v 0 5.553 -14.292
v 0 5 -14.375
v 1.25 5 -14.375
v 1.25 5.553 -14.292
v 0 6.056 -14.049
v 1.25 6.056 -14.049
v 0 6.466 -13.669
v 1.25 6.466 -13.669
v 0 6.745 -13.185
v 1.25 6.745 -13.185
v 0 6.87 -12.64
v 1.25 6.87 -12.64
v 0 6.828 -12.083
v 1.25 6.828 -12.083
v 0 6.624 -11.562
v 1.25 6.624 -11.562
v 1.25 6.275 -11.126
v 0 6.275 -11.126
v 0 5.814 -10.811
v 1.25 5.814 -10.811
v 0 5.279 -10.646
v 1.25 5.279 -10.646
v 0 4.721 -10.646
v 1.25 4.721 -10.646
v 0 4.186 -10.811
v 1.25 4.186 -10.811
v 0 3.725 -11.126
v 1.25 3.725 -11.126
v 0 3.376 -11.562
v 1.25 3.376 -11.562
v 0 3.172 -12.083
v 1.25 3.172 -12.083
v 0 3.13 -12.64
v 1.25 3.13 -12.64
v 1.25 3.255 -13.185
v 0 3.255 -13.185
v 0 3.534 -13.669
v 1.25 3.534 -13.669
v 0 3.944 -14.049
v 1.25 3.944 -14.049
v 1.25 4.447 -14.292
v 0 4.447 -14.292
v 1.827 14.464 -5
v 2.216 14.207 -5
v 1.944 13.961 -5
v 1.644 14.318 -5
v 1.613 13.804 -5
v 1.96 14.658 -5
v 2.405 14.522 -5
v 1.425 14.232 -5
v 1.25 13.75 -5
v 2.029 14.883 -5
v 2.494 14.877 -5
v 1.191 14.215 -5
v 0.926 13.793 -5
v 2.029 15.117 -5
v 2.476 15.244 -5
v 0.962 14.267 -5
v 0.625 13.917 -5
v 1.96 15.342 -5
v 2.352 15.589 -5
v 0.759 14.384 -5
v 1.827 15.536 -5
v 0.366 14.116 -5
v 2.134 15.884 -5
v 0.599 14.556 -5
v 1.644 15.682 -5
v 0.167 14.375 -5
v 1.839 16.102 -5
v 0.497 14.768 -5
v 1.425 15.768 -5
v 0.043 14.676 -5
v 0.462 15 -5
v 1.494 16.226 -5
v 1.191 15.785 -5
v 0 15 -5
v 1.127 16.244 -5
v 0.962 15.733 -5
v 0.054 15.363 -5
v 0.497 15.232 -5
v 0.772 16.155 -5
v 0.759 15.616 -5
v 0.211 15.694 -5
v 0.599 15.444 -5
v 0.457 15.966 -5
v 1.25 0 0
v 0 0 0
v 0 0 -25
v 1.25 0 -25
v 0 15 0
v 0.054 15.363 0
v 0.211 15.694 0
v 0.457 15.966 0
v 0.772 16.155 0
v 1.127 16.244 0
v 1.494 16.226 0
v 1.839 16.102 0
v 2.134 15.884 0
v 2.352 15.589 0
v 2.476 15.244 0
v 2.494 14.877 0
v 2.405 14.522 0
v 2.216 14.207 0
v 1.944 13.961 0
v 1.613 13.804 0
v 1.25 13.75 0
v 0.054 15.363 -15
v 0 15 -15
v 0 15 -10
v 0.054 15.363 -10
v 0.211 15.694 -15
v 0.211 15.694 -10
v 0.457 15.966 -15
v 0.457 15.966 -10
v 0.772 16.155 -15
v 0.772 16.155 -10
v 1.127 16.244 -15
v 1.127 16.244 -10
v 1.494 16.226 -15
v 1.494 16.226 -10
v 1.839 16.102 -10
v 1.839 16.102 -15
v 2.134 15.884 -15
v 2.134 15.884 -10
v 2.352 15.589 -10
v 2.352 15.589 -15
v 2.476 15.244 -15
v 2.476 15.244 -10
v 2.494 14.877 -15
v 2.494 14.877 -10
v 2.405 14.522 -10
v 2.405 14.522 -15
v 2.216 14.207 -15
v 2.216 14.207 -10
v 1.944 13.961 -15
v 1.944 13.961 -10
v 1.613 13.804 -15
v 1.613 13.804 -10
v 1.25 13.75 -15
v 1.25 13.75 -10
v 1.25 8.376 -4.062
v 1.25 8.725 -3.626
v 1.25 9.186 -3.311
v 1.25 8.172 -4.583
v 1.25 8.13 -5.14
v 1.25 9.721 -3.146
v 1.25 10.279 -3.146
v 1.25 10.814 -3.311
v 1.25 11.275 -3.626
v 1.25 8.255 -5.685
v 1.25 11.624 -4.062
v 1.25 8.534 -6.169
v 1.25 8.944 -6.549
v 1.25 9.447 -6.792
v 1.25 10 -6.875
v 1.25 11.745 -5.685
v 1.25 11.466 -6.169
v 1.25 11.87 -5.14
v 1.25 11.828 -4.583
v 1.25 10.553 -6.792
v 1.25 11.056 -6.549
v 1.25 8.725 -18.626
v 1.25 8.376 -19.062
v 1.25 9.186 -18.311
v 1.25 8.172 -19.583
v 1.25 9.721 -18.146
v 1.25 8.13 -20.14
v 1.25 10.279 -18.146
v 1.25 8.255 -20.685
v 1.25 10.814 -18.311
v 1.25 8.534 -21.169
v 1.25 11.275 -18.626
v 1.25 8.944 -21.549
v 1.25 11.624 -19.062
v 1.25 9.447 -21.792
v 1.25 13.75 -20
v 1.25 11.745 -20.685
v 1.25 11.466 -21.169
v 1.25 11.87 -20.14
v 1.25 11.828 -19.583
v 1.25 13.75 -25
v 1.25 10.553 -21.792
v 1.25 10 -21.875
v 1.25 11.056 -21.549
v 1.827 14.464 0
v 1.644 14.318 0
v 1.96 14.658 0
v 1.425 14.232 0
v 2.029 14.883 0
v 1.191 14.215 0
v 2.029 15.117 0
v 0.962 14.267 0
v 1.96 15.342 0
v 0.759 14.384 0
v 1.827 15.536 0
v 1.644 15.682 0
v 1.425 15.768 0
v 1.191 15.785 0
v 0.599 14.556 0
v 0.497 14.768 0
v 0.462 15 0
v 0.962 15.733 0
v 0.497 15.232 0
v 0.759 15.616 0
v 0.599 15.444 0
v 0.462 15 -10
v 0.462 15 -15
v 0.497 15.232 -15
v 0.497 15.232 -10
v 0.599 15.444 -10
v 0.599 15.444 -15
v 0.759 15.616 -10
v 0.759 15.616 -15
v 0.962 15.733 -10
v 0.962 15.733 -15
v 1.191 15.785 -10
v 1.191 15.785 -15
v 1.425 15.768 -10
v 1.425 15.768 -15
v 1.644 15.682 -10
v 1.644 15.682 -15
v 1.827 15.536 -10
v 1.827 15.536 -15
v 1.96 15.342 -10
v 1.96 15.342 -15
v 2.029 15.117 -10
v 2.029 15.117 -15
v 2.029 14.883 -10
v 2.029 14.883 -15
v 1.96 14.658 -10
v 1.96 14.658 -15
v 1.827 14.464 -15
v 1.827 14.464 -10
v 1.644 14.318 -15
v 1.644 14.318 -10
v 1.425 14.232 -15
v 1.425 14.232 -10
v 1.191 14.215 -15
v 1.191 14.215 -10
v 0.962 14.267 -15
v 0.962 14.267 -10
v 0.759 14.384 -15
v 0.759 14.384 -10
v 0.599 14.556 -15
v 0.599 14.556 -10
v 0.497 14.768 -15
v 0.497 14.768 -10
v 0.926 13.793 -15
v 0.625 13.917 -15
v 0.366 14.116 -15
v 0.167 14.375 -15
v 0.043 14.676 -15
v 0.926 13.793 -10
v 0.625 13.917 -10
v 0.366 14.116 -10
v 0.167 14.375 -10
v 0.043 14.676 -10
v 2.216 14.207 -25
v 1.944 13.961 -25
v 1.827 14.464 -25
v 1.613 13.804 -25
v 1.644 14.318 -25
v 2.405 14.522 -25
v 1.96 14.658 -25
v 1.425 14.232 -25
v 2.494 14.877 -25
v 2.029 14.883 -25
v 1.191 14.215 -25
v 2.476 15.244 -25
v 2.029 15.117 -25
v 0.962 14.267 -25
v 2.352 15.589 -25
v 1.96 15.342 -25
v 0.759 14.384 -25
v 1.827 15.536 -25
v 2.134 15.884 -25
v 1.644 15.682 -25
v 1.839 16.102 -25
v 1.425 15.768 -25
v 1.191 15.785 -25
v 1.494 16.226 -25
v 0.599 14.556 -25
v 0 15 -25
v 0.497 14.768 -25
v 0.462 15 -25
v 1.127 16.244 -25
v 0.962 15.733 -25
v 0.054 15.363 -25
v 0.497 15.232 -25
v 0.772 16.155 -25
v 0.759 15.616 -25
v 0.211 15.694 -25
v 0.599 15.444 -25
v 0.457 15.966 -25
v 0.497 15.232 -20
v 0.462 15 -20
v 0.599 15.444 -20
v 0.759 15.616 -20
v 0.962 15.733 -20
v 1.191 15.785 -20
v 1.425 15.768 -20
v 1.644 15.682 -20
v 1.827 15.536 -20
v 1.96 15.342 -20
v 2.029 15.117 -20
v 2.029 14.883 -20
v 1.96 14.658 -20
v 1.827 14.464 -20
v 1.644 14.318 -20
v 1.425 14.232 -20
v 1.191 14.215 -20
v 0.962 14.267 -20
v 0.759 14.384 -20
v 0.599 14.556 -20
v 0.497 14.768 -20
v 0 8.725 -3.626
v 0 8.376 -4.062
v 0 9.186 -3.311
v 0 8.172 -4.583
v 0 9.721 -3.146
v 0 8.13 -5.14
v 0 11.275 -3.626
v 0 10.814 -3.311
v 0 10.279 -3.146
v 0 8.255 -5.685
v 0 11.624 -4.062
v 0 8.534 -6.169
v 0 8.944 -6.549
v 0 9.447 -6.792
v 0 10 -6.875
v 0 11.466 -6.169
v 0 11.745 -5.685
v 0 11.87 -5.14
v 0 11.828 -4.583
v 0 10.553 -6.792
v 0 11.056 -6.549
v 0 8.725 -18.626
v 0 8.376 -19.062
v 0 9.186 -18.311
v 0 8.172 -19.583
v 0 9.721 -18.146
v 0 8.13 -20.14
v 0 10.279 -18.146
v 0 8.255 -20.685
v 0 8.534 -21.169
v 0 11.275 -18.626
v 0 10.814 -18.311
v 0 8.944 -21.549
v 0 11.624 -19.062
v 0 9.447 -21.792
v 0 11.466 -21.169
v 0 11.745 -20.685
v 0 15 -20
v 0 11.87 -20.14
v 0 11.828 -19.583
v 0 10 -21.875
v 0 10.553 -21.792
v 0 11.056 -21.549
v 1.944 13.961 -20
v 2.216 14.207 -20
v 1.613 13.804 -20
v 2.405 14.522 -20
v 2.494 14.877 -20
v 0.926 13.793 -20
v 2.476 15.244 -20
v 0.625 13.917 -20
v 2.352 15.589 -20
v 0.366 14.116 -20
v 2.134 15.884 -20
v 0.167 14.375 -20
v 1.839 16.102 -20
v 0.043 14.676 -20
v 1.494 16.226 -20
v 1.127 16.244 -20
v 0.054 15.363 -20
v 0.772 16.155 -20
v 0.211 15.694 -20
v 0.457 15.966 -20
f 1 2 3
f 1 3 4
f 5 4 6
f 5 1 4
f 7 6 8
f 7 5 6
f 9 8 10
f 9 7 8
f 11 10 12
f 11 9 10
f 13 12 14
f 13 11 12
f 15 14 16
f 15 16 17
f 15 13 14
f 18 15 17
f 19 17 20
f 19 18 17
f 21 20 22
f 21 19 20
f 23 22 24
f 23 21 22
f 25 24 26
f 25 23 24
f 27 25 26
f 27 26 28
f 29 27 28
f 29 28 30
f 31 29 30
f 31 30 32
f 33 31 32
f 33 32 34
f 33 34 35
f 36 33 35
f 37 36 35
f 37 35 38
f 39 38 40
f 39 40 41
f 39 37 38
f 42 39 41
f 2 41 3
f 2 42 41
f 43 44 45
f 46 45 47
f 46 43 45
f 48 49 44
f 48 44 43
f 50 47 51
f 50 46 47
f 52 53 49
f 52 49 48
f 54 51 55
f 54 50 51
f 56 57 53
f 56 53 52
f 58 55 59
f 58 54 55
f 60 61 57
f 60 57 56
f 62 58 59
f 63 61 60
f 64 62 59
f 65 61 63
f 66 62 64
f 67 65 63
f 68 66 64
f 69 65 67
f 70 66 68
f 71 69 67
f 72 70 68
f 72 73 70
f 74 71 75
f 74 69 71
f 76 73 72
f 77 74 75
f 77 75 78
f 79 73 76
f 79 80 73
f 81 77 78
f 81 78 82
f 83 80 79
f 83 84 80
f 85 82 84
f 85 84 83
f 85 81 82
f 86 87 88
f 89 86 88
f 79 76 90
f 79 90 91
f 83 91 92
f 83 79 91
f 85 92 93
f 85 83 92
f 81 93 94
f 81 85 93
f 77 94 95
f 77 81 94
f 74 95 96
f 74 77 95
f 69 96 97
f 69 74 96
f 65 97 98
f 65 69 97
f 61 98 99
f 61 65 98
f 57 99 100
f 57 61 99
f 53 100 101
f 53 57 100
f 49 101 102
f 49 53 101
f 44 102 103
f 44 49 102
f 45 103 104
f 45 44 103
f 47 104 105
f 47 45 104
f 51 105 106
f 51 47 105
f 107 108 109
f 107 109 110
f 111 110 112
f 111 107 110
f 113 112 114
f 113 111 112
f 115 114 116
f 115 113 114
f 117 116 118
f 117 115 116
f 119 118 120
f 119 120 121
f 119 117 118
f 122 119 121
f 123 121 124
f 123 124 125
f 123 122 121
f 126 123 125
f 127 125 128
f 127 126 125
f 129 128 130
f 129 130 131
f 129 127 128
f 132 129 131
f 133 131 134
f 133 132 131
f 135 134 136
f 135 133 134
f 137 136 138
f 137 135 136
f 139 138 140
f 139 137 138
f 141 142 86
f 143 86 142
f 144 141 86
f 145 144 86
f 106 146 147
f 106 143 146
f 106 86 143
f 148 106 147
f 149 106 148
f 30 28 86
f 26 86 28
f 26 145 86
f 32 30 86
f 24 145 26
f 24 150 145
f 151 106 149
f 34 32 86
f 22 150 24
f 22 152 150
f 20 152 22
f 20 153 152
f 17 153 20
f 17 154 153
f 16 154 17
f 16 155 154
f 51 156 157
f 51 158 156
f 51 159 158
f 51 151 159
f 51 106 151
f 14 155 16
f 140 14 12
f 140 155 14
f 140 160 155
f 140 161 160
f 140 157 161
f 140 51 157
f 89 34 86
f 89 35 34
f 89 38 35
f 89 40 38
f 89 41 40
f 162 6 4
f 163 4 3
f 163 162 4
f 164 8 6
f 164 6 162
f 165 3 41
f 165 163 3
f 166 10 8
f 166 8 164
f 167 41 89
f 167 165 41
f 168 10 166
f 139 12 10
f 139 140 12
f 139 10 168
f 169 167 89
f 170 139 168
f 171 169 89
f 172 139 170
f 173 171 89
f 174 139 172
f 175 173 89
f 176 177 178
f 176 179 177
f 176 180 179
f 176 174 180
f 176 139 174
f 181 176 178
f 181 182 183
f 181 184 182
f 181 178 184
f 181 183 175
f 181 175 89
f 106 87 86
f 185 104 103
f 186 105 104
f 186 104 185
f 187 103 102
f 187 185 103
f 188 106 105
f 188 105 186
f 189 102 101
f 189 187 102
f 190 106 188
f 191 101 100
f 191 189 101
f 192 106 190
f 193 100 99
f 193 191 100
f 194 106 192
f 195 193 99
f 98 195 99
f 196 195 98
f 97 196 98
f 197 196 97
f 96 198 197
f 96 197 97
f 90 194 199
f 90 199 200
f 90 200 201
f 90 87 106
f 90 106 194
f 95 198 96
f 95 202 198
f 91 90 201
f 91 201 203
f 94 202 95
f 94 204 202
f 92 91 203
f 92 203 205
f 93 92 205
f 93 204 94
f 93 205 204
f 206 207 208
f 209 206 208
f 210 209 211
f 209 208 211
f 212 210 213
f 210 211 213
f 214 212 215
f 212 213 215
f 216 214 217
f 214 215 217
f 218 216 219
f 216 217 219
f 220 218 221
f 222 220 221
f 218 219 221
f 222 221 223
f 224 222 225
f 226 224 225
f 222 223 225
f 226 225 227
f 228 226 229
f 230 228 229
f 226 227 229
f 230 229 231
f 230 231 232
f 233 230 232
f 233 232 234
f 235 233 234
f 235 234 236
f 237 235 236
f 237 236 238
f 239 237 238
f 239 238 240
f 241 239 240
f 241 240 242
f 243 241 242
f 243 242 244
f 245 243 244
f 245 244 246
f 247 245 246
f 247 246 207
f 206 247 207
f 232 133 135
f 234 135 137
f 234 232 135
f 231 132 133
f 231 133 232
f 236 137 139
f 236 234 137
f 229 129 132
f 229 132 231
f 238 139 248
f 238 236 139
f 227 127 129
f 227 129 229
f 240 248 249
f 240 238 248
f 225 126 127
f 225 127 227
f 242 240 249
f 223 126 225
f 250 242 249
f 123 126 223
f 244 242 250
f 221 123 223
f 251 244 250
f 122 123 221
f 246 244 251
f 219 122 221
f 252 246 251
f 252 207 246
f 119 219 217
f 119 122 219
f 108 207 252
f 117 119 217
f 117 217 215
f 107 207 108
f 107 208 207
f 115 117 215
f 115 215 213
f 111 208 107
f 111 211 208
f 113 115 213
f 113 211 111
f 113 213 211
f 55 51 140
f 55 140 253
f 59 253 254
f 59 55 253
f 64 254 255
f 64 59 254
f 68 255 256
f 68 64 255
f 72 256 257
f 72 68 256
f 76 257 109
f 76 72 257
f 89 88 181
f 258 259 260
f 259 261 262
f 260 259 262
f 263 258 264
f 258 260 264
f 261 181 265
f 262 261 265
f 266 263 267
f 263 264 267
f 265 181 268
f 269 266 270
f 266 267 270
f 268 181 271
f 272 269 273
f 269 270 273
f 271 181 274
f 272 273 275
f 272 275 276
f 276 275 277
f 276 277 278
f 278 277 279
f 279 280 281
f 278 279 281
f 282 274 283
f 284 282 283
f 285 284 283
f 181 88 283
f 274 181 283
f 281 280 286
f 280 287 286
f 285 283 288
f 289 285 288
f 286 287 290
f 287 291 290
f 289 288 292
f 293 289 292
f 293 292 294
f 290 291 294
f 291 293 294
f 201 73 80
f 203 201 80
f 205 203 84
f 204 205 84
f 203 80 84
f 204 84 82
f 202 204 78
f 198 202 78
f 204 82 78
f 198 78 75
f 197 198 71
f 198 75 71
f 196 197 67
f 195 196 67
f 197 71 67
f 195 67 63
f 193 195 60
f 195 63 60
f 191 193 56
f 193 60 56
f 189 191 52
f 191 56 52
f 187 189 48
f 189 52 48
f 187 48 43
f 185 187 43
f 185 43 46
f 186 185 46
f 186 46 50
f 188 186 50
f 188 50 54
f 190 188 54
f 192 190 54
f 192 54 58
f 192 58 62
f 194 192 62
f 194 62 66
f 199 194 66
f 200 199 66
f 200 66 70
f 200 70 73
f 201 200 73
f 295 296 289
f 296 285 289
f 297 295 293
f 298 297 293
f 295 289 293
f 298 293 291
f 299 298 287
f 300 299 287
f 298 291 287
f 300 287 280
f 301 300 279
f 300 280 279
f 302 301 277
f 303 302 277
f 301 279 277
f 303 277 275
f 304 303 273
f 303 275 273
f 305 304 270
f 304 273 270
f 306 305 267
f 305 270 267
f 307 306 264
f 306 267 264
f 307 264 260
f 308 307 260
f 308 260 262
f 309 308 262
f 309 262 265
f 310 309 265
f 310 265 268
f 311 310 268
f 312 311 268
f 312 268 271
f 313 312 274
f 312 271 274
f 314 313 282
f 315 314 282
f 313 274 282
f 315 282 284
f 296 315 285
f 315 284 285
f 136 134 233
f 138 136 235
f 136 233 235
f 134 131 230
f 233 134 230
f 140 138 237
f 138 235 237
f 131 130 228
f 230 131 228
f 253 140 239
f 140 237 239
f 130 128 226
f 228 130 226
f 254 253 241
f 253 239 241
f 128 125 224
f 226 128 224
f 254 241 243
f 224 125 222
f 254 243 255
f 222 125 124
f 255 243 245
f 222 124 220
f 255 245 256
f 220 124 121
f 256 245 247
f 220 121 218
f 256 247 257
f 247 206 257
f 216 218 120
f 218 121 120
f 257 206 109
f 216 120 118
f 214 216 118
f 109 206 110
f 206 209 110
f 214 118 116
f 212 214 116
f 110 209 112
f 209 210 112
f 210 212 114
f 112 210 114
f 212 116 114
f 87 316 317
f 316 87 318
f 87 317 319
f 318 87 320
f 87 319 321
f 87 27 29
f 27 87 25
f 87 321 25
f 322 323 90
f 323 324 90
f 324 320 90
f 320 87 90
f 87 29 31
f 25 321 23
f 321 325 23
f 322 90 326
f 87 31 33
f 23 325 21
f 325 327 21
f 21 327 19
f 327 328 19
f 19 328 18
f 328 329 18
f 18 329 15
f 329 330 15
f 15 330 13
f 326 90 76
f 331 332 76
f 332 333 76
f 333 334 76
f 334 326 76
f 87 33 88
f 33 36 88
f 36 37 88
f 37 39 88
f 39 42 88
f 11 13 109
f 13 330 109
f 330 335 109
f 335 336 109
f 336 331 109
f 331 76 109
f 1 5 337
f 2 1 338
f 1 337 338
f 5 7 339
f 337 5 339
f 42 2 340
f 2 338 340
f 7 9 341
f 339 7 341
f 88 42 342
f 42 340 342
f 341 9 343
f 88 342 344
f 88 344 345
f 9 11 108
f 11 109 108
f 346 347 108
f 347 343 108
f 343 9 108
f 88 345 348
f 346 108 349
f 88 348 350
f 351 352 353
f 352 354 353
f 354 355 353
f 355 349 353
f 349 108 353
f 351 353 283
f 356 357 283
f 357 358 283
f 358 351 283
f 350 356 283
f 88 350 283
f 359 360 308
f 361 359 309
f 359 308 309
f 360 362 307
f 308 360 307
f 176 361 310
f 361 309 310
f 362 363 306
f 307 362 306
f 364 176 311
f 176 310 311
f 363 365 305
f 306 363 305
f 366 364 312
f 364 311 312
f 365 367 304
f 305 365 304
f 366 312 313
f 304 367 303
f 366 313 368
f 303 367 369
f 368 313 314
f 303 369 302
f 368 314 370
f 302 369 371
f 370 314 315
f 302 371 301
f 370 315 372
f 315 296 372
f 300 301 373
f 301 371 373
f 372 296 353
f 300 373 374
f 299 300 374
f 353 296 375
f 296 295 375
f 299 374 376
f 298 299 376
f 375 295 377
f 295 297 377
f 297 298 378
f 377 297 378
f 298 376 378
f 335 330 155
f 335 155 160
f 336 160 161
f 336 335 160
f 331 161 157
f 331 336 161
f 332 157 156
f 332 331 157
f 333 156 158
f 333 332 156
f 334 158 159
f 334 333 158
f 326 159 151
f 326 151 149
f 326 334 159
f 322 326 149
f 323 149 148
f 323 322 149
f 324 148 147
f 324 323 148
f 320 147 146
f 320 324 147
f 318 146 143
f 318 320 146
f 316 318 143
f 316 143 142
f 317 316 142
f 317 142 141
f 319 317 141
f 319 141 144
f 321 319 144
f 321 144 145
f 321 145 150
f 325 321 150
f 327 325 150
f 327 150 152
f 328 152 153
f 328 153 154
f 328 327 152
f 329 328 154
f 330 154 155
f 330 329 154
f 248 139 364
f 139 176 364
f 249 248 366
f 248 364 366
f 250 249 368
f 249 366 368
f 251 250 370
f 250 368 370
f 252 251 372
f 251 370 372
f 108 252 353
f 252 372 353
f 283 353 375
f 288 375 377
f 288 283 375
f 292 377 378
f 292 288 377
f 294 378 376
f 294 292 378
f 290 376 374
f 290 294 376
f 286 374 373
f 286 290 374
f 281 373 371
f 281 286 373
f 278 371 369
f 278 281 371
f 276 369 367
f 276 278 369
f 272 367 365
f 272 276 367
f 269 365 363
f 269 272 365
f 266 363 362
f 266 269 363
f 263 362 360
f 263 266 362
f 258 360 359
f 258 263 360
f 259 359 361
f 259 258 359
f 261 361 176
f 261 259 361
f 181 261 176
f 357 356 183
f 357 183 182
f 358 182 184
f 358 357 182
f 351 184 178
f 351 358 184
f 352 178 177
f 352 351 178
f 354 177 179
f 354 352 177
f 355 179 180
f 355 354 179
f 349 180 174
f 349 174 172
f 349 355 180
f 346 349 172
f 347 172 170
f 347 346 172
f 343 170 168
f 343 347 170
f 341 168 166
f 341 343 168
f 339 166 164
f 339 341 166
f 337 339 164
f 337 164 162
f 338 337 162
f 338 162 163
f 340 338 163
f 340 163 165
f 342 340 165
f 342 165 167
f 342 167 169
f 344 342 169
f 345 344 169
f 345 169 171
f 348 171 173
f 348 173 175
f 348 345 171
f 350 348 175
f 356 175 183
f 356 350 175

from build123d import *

# Parameters (mm, degrees)
SKETCH1_W           = 50
SKETCH1_H           = 30
SKETCH1_R           = 3.75
BOSS_EXTRUDE1_DEPTH = 2.5
SKETCH3_R           = 2.5
BOSS_EXTRUDE3_DEPTH = 10
SKETCH4_R           = 1.575
CUT_EXTRUDE1_DEPTH  = 50
LPATTERN1_COUNT     = 3
LPATTERN1_PITCH     = 20
CUT_EXTRUDE3_START  = -10
SKETCH5_R           = 2.5
CUT_EXTRUDE3_DEPTH  = 10
CUT_EXTRUDE4_START  = -40
SKETCH5_2_R         = 2.5
CUT_EXTRUDE4_DEPTH  = 10
ESCALA1_SCALE       = 0.5


with BuildPart() as part:
    # Sketch1 → Boss-Extrude1 (new body)
    with BuildSketch(Plane(origin=(0, 0, 0), x_dir=(0, 0, -1), z_dir=(1, 0, 0))):
        with Locations((25, 15)):
            Rectangle(SKETCH1_W, SKETCH1_H)
        with Locations((40, 20)):
            Circle(SKETCH1_R, mode=Mode.SUBTRACT)
        with Locations((25, 10)):
            Circle(SKETCH1_R, mode=Mode.SUBTRACT)
        with Locations((10, 20)):
            Circle(SKETCH1_R, mode=Mode.SUBTRACT)
    extrude(amount=BOSS_EXTRUDE1_DEPTH)

    # Sketch3 → Boss-Extrude3 (add)
    with BuildSketch(Plane(origin=(0, 0, -50), x_dir=(-1, 0, 0), z_dir=(0, 0, -1))):
        with Locations((-2.5, 30)):
            Circle(SKETCH3_R)
    boss_extrude3 = extrude(amount=-BOSS_EXTRUDE3_DEPTH)

    # Sketch4 → Cut-Extrude1 (cut)
    with BuildSketch(Plane(origin=(0, 0, -50), x_dir=(-1, 0, 0), z_dir=(0, 0, -1))):
        with Locations((-2.5, 30)):
            Circle(SKETCH4_R)
    cut_extrude1 = extrude(amount=-CUT_EXTRUDE1_DEPTH, mode=Mode.SUBTRACT)

    # LPattern1: Boss-Extrude3, Cut-Extrude1 ×3
    with Locations(*[(0, 0, i * LPATTERN1_PITCH) for i in range(1, LPATTERN1_COUNT)]):
        add(boss_extrude3)
        add(cut_extrude1, mode=Mode.SUBTRACT)

    # Sketch5 → Cut-Extrude3 (cut)
    with BuildSketch(Plane(origin=(0, 0, -50), x_dir=(-1, 0, 0), z_dir=(0, 0, -1)).offset(CUT_EXTRUDE3_START)):
        with Locations((-2.5, 30)):
            Circle(SKETCH5_R)
    extrude(amount=-CUT_EXTRUDE3_DEPTH, mode=Mode.SUBTRACT)

    # Sketch5<2> → Cut-Extrude4 (cut)
    with BuildSketch(Plane(origin=(0, 0, -50), x_dir=(-1, 0, 0), z_dir=(0, 0, -1)).offset(CUT_EXTRUDE4_START)):
        with Locations((-2.5, 30)):
            Circle(SKETCH5_2_R)
    extrude(amount=CUT_EXTRUDE4_DEPTH, mode=Mode.SUBTRACT)


with BuildPart() as part_1:
    # Escala1: scaled about (0, 0, 0)
    add(part.part.scale(ESCALA1_SCALE))


solid = part_1.part
